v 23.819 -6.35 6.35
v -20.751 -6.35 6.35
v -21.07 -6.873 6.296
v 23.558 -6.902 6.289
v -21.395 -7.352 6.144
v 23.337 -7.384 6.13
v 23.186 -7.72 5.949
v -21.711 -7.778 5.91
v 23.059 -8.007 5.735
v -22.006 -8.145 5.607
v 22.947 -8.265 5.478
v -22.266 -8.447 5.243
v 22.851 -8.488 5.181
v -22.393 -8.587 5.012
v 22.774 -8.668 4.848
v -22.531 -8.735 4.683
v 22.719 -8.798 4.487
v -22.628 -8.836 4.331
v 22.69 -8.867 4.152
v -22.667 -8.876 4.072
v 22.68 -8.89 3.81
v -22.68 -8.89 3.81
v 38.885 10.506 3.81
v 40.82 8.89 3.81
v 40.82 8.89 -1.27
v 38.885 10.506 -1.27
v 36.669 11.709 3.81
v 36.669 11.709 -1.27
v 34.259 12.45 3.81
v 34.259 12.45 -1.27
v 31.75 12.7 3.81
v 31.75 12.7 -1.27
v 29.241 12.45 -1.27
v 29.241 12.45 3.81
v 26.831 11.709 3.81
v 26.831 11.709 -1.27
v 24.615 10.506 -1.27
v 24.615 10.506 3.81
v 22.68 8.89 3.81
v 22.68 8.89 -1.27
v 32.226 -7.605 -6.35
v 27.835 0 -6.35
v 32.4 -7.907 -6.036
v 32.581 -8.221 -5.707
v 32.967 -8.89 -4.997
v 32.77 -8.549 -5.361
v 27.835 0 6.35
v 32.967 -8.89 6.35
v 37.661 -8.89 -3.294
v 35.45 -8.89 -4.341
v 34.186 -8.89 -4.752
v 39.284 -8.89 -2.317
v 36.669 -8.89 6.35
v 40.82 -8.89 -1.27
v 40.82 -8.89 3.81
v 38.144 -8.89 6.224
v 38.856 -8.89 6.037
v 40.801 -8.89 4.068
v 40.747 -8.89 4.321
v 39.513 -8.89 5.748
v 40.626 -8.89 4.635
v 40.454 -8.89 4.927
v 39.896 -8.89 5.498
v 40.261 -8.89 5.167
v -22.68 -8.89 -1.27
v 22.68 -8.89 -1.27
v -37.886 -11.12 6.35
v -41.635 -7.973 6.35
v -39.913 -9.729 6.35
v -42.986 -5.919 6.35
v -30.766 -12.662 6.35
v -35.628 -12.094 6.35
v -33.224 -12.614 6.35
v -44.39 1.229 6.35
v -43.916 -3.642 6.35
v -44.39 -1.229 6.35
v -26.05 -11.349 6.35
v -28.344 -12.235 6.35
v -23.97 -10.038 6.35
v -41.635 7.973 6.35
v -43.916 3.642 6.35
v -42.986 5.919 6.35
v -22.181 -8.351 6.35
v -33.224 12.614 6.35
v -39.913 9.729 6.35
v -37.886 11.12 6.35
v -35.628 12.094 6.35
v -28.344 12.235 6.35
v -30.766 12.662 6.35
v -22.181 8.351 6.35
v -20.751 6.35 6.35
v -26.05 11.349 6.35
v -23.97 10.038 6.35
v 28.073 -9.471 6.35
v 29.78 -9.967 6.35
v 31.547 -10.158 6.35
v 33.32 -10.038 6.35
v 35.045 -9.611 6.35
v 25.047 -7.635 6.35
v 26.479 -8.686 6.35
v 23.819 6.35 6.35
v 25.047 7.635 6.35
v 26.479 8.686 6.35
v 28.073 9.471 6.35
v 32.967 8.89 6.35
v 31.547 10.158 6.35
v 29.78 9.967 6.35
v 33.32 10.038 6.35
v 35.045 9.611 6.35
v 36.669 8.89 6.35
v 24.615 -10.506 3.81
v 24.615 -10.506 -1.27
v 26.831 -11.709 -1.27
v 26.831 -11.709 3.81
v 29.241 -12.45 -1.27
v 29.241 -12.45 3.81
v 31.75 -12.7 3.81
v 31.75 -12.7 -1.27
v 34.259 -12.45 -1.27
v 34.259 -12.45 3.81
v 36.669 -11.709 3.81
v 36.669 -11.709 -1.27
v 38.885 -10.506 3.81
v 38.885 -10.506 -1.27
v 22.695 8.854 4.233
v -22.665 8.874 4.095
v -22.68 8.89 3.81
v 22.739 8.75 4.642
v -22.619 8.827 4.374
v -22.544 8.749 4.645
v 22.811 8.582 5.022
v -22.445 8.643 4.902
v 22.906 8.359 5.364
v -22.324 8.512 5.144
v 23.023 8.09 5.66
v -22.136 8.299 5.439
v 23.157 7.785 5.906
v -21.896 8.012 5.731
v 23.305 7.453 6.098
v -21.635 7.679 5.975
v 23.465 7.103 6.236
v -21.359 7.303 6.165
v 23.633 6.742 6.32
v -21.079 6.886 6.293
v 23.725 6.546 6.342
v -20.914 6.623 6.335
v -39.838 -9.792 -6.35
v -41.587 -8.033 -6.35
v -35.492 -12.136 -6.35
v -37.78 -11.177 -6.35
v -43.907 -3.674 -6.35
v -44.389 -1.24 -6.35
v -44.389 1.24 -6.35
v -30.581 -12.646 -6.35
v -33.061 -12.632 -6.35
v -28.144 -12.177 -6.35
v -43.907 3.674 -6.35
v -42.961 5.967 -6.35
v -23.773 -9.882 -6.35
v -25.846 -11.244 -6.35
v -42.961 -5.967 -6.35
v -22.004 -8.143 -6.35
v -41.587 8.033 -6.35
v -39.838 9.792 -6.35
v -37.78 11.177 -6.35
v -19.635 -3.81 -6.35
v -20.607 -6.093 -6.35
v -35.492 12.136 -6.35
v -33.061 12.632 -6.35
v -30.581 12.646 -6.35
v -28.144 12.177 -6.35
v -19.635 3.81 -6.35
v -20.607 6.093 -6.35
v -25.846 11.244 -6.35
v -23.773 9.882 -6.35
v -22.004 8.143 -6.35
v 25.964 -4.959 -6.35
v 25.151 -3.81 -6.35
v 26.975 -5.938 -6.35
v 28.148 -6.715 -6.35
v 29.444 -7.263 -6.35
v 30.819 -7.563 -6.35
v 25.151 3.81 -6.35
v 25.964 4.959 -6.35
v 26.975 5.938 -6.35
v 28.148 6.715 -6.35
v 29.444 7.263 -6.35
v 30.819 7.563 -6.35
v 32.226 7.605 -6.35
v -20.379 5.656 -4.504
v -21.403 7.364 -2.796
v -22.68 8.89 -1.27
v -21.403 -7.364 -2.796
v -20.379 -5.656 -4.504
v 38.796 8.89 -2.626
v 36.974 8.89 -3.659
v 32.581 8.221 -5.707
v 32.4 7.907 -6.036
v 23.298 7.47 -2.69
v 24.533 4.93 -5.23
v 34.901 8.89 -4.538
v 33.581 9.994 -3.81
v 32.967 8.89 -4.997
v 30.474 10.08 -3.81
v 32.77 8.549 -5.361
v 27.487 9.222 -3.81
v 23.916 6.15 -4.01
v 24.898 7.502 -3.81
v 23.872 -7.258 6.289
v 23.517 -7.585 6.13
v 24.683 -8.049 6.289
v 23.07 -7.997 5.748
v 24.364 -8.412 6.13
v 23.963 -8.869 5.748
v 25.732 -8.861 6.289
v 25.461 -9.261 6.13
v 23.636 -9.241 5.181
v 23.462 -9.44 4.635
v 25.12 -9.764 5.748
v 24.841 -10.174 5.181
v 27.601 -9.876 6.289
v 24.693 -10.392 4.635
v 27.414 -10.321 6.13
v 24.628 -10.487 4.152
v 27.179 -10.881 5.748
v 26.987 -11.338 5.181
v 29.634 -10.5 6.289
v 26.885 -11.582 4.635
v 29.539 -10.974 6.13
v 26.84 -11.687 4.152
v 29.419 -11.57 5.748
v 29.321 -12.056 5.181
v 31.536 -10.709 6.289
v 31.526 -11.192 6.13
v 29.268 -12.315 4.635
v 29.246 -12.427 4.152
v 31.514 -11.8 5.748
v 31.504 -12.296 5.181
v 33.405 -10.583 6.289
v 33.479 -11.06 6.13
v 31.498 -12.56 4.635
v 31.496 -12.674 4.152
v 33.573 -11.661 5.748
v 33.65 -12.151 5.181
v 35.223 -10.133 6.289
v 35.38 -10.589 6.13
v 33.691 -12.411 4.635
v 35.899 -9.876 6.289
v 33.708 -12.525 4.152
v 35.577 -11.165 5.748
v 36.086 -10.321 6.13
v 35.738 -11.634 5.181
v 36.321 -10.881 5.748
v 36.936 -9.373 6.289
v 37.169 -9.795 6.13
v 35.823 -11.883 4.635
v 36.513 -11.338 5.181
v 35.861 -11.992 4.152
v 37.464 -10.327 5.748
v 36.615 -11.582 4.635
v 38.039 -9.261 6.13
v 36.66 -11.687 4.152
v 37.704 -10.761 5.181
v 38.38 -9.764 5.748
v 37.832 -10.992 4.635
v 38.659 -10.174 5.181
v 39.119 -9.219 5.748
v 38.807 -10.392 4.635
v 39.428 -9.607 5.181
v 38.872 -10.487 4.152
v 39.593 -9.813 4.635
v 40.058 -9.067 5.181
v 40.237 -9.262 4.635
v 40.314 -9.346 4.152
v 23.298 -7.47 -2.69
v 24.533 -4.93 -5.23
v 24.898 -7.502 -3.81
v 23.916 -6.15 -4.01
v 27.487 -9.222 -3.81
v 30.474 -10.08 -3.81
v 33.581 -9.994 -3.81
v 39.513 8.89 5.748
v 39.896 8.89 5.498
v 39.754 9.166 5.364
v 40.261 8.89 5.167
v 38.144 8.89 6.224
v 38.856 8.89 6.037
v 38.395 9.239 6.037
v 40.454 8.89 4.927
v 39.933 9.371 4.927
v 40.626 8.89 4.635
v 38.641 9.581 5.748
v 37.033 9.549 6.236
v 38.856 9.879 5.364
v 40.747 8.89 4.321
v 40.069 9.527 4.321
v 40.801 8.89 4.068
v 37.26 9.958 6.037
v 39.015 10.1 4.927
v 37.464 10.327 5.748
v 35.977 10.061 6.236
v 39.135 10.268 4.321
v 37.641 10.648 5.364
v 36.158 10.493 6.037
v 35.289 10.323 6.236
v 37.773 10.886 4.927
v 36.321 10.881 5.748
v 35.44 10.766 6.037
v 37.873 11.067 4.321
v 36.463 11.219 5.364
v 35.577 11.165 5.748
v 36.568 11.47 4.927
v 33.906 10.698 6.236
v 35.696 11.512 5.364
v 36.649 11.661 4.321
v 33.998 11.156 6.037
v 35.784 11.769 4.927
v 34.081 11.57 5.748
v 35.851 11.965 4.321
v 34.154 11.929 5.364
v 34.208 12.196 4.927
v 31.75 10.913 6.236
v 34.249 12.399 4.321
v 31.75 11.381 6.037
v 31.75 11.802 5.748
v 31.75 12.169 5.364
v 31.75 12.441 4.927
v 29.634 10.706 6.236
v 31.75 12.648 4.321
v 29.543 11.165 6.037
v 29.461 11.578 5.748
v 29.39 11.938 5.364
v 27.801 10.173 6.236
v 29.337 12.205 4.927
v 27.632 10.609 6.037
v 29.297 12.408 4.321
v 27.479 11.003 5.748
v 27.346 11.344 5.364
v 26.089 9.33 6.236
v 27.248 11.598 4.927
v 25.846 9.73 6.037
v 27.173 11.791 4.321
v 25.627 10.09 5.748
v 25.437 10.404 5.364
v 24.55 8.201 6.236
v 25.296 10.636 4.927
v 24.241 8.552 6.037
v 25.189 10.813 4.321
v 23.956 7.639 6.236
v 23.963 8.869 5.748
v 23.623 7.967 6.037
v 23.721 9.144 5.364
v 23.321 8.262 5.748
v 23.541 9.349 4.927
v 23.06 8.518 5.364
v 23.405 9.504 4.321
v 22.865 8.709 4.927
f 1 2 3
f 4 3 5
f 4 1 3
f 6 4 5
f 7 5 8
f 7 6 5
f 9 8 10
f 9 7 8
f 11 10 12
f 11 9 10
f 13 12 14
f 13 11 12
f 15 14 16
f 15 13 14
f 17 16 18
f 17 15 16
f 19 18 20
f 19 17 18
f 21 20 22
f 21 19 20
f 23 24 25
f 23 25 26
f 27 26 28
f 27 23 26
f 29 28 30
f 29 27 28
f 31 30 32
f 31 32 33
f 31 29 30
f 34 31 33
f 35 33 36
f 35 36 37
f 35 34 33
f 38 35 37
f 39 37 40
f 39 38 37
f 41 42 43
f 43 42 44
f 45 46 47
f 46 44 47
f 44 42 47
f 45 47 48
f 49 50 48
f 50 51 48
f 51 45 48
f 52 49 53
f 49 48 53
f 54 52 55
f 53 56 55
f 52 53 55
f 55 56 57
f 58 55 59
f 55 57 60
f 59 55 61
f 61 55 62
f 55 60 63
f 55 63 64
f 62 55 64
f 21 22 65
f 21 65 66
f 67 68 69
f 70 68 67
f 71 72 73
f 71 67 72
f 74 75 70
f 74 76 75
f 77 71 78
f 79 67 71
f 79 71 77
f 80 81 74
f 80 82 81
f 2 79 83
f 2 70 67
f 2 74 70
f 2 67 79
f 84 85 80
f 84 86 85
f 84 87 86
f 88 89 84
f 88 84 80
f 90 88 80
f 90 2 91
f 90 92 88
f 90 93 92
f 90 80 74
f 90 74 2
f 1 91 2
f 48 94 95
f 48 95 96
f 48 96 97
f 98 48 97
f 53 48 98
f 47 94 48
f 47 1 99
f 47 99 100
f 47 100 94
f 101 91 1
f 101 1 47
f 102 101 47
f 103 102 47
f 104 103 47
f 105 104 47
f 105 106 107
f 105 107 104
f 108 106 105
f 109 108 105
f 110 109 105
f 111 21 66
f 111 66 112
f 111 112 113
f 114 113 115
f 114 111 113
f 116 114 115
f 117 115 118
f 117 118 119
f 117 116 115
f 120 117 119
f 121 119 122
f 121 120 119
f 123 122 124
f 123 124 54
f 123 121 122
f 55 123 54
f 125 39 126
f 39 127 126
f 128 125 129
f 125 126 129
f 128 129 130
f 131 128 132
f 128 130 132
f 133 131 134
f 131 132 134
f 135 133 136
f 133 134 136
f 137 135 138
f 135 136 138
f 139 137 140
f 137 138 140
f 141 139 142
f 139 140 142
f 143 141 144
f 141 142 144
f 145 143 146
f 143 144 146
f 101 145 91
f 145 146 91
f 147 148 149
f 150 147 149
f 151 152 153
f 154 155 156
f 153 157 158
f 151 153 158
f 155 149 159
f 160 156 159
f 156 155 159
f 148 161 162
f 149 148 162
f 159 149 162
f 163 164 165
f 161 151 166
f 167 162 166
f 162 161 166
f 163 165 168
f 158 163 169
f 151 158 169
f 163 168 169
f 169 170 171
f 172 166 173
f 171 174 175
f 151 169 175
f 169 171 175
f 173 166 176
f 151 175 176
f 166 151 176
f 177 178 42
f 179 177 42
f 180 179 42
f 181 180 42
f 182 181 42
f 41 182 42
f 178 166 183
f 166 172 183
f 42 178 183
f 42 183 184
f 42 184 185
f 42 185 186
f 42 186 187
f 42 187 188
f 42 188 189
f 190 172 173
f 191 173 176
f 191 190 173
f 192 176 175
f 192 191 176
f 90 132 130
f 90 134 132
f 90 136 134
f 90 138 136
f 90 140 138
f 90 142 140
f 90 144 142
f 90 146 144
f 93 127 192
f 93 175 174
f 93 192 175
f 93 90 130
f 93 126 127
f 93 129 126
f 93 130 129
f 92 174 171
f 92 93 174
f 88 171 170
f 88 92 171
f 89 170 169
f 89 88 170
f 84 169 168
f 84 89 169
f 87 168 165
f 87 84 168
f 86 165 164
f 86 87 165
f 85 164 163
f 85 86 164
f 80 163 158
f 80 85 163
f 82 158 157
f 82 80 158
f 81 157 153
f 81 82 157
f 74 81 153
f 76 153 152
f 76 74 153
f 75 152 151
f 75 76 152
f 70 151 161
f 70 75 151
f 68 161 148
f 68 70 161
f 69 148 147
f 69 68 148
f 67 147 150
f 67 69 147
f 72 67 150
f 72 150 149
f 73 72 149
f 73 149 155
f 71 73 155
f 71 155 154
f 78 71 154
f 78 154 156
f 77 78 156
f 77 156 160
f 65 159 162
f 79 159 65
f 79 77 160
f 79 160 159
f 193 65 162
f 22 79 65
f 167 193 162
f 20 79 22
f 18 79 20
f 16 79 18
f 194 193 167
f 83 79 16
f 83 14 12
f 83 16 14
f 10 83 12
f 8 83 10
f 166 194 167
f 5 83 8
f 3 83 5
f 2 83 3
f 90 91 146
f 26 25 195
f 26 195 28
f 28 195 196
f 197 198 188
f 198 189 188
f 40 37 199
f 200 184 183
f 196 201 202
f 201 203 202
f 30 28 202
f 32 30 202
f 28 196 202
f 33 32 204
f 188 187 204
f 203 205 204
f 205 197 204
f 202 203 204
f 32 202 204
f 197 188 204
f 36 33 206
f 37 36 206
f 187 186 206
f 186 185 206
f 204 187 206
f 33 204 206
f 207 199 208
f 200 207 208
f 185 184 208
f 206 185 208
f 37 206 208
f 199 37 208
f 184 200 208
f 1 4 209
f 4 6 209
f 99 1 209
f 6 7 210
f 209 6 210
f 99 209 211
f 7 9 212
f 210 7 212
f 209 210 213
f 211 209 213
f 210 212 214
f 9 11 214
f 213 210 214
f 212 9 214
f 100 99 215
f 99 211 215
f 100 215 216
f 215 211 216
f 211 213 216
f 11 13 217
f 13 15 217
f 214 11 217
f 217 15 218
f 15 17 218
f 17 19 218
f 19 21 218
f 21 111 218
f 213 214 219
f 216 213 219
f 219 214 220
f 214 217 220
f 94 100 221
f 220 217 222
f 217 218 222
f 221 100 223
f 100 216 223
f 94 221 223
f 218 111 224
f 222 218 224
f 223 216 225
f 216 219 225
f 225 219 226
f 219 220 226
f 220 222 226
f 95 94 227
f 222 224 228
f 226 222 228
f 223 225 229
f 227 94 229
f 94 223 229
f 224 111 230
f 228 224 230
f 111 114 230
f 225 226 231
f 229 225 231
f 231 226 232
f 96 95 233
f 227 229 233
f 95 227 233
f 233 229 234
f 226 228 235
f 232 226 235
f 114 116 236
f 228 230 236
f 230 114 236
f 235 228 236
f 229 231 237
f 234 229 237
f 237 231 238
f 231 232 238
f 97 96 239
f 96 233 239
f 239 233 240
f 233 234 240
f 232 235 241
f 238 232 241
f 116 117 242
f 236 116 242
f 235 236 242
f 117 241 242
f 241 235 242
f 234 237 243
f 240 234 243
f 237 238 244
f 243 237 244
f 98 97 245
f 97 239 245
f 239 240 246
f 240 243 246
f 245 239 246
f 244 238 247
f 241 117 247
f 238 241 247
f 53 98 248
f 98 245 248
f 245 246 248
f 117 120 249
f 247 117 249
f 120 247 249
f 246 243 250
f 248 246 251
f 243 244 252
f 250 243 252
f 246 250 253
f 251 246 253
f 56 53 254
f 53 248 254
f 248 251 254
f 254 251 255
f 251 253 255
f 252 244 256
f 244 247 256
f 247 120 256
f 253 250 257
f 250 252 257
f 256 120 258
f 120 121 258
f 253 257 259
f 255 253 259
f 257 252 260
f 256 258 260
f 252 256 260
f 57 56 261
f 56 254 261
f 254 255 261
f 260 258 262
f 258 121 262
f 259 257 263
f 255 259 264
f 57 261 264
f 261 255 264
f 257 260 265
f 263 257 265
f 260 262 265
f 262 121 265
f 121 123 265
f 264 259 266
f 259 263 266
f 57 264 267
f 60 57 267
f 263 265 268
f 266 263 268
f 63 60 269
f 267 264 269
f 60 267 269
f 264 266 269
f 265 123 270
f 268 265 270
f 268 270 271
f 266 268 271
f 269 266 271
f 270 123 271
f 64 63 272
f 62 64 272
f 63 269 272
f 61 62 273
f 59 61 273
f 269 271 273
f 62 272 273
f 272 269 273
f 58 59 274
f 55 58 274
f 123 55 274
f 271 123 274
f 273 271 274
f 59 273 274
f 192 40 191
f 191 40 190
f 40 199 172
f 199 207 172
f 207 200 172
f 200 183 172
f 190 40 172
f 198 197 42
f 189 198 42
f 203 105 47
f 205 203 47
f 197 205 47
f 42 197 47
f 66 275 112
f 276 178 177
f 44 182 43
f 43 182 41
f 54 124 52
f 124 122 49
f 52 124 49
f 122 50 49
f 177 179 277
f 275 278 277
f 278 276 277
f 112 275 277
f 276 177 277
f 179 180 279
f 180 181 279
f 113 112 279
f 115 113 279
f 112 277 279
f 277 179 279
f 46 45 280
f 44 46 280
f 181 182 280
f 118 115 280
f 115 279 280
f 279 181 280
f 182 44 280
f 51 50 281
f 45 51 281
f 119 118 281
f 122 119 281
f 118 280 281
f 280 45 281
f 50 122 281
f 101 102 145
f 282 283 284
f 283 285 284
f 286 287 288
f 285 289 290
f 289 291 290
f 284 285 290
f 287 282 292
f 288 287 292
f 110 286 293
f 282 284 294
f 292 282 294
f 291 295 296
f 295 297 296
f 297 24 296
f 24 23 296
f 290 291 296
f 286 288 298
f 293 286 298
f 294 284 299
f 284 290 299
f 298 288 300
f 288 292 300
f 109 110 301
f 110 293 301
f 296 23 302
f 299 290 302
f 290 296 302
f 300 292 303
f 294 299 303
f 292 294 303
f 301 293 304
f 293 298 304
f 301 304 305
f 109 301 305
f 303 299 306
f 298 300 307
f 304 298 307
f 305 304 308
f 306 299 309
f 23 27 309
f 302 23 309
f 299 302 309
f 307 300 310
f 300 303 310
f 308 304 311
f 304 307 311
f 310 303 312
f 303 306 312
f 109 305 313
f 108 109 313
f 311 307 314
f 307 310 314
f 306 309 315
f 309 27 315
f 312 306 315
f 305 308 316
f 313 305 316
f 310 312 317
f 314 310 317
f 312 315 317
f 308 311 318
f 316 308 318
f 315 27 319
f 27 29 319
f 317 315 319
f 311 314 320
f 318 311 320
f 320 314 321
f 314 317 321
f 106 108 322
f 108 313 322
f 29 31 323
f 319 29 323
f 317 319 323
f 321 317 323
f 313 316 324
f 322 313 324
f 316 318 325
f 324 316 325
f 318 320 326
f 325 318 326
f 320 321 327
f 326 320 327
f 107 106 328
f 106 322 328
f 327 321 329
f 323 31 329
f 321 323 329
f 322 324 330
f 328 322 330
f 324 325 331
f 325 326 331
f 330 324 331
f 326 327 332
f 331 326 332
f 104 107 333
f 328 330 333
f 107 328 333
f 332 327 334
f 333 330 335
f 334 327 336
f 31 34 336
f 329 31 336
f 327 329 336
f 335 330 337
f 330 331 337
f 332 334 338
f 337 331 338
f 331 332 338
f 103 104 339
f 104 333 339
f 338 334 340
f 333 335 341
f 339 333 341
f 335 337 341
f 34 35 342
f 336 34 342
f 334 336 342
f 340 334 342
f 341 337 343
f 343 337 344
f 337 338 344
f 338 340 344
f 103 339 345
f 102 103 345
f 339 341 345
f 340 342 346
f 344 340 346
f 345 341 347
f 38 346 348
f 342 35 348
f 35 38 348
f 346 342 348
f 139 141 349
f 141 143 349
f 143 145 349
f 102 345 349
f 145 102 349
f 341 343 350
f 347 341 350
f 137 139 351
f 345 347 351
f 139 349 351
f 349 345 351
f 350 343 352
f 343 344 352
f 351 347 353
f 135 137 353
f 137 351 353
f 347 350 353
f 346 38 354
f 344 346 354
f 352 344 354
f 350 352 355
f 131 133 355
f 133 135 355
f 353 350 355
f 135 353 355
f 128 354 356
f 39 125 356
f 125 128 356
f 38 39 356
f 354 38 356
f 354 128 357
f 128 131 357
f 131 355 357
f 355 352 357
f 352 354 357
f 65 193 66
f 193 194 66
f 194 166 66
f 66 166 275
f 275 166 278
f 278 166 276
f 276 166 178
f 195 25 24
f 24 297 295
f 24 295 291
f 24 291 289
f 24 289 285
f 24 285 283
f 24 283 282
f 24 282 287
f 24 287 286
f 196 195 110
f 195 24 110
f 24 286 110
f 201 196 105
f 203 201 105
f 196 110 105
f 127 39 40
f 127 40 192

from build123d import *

# Parameters (mm, degrees)
F1_DEPTH = 6.35
F3_DEPTH = 12.701
F4_R     = 2.54
F5_SIZE  = 5.08


with BuildPart() as f1:
    # F0 (on Top) → F1 (new body, symmetric)
    with BuildSketch(Plane.XY):
        with BuildLine():
            Line((22.6803858958, 8.89), (-22.6803858958, 8.89))
            ThreePointArc((-22.6803858958, 8.89), (-44.45, 0), (-22.6803858958, -8.89))
            Line((-22.6803858958, -8.89), (22.6803858958, -8.89))
            ThreePointArc((22.6803858958, -8.89), (44.45, 0), (22.6803858958, 8.89))
        make_face()
    extrude(amount=F1_DEPTH, both=True)

    # F2 (on face) → F3 (cut, through all)
    with BuildSketch(Plane.XY.offset(6.35)):
        Polygon((27.8347122138, 0), (32.9673561069, -8.89), (43.2326438931, -8.89), (48.3652877862, 0), (43.2326438931, 8.89), (32.9673561069, 8.89), align=None)
    extrude(amount=-F3_DEPTH, mode=Mode.SUBTRACT)

    # F4
    f4_edges = [f1.edges().sort_by_distance(p)[0] for p in [
        (0, -8.89, 6.35),
        (31.75, -12.7, 6.35),
        (0, 8.89, 6.35),
        (31.75, 12.7, 6.35),
    ]]
    fillet(f4_edges, radius=F4_R)

    # F5
    f5_edges = [f1.edges().sort_by_distance(p)[0] for p in [
        (0, 8.89, -6.35),
        (31.75, 12.7, -6.35),
        (0, -8.89, -6.35),
        (31.75, -12.7, -6.35),
    ]]
    chamfer(f5_edges, length=F5_SIZE)


solid = f1.part
